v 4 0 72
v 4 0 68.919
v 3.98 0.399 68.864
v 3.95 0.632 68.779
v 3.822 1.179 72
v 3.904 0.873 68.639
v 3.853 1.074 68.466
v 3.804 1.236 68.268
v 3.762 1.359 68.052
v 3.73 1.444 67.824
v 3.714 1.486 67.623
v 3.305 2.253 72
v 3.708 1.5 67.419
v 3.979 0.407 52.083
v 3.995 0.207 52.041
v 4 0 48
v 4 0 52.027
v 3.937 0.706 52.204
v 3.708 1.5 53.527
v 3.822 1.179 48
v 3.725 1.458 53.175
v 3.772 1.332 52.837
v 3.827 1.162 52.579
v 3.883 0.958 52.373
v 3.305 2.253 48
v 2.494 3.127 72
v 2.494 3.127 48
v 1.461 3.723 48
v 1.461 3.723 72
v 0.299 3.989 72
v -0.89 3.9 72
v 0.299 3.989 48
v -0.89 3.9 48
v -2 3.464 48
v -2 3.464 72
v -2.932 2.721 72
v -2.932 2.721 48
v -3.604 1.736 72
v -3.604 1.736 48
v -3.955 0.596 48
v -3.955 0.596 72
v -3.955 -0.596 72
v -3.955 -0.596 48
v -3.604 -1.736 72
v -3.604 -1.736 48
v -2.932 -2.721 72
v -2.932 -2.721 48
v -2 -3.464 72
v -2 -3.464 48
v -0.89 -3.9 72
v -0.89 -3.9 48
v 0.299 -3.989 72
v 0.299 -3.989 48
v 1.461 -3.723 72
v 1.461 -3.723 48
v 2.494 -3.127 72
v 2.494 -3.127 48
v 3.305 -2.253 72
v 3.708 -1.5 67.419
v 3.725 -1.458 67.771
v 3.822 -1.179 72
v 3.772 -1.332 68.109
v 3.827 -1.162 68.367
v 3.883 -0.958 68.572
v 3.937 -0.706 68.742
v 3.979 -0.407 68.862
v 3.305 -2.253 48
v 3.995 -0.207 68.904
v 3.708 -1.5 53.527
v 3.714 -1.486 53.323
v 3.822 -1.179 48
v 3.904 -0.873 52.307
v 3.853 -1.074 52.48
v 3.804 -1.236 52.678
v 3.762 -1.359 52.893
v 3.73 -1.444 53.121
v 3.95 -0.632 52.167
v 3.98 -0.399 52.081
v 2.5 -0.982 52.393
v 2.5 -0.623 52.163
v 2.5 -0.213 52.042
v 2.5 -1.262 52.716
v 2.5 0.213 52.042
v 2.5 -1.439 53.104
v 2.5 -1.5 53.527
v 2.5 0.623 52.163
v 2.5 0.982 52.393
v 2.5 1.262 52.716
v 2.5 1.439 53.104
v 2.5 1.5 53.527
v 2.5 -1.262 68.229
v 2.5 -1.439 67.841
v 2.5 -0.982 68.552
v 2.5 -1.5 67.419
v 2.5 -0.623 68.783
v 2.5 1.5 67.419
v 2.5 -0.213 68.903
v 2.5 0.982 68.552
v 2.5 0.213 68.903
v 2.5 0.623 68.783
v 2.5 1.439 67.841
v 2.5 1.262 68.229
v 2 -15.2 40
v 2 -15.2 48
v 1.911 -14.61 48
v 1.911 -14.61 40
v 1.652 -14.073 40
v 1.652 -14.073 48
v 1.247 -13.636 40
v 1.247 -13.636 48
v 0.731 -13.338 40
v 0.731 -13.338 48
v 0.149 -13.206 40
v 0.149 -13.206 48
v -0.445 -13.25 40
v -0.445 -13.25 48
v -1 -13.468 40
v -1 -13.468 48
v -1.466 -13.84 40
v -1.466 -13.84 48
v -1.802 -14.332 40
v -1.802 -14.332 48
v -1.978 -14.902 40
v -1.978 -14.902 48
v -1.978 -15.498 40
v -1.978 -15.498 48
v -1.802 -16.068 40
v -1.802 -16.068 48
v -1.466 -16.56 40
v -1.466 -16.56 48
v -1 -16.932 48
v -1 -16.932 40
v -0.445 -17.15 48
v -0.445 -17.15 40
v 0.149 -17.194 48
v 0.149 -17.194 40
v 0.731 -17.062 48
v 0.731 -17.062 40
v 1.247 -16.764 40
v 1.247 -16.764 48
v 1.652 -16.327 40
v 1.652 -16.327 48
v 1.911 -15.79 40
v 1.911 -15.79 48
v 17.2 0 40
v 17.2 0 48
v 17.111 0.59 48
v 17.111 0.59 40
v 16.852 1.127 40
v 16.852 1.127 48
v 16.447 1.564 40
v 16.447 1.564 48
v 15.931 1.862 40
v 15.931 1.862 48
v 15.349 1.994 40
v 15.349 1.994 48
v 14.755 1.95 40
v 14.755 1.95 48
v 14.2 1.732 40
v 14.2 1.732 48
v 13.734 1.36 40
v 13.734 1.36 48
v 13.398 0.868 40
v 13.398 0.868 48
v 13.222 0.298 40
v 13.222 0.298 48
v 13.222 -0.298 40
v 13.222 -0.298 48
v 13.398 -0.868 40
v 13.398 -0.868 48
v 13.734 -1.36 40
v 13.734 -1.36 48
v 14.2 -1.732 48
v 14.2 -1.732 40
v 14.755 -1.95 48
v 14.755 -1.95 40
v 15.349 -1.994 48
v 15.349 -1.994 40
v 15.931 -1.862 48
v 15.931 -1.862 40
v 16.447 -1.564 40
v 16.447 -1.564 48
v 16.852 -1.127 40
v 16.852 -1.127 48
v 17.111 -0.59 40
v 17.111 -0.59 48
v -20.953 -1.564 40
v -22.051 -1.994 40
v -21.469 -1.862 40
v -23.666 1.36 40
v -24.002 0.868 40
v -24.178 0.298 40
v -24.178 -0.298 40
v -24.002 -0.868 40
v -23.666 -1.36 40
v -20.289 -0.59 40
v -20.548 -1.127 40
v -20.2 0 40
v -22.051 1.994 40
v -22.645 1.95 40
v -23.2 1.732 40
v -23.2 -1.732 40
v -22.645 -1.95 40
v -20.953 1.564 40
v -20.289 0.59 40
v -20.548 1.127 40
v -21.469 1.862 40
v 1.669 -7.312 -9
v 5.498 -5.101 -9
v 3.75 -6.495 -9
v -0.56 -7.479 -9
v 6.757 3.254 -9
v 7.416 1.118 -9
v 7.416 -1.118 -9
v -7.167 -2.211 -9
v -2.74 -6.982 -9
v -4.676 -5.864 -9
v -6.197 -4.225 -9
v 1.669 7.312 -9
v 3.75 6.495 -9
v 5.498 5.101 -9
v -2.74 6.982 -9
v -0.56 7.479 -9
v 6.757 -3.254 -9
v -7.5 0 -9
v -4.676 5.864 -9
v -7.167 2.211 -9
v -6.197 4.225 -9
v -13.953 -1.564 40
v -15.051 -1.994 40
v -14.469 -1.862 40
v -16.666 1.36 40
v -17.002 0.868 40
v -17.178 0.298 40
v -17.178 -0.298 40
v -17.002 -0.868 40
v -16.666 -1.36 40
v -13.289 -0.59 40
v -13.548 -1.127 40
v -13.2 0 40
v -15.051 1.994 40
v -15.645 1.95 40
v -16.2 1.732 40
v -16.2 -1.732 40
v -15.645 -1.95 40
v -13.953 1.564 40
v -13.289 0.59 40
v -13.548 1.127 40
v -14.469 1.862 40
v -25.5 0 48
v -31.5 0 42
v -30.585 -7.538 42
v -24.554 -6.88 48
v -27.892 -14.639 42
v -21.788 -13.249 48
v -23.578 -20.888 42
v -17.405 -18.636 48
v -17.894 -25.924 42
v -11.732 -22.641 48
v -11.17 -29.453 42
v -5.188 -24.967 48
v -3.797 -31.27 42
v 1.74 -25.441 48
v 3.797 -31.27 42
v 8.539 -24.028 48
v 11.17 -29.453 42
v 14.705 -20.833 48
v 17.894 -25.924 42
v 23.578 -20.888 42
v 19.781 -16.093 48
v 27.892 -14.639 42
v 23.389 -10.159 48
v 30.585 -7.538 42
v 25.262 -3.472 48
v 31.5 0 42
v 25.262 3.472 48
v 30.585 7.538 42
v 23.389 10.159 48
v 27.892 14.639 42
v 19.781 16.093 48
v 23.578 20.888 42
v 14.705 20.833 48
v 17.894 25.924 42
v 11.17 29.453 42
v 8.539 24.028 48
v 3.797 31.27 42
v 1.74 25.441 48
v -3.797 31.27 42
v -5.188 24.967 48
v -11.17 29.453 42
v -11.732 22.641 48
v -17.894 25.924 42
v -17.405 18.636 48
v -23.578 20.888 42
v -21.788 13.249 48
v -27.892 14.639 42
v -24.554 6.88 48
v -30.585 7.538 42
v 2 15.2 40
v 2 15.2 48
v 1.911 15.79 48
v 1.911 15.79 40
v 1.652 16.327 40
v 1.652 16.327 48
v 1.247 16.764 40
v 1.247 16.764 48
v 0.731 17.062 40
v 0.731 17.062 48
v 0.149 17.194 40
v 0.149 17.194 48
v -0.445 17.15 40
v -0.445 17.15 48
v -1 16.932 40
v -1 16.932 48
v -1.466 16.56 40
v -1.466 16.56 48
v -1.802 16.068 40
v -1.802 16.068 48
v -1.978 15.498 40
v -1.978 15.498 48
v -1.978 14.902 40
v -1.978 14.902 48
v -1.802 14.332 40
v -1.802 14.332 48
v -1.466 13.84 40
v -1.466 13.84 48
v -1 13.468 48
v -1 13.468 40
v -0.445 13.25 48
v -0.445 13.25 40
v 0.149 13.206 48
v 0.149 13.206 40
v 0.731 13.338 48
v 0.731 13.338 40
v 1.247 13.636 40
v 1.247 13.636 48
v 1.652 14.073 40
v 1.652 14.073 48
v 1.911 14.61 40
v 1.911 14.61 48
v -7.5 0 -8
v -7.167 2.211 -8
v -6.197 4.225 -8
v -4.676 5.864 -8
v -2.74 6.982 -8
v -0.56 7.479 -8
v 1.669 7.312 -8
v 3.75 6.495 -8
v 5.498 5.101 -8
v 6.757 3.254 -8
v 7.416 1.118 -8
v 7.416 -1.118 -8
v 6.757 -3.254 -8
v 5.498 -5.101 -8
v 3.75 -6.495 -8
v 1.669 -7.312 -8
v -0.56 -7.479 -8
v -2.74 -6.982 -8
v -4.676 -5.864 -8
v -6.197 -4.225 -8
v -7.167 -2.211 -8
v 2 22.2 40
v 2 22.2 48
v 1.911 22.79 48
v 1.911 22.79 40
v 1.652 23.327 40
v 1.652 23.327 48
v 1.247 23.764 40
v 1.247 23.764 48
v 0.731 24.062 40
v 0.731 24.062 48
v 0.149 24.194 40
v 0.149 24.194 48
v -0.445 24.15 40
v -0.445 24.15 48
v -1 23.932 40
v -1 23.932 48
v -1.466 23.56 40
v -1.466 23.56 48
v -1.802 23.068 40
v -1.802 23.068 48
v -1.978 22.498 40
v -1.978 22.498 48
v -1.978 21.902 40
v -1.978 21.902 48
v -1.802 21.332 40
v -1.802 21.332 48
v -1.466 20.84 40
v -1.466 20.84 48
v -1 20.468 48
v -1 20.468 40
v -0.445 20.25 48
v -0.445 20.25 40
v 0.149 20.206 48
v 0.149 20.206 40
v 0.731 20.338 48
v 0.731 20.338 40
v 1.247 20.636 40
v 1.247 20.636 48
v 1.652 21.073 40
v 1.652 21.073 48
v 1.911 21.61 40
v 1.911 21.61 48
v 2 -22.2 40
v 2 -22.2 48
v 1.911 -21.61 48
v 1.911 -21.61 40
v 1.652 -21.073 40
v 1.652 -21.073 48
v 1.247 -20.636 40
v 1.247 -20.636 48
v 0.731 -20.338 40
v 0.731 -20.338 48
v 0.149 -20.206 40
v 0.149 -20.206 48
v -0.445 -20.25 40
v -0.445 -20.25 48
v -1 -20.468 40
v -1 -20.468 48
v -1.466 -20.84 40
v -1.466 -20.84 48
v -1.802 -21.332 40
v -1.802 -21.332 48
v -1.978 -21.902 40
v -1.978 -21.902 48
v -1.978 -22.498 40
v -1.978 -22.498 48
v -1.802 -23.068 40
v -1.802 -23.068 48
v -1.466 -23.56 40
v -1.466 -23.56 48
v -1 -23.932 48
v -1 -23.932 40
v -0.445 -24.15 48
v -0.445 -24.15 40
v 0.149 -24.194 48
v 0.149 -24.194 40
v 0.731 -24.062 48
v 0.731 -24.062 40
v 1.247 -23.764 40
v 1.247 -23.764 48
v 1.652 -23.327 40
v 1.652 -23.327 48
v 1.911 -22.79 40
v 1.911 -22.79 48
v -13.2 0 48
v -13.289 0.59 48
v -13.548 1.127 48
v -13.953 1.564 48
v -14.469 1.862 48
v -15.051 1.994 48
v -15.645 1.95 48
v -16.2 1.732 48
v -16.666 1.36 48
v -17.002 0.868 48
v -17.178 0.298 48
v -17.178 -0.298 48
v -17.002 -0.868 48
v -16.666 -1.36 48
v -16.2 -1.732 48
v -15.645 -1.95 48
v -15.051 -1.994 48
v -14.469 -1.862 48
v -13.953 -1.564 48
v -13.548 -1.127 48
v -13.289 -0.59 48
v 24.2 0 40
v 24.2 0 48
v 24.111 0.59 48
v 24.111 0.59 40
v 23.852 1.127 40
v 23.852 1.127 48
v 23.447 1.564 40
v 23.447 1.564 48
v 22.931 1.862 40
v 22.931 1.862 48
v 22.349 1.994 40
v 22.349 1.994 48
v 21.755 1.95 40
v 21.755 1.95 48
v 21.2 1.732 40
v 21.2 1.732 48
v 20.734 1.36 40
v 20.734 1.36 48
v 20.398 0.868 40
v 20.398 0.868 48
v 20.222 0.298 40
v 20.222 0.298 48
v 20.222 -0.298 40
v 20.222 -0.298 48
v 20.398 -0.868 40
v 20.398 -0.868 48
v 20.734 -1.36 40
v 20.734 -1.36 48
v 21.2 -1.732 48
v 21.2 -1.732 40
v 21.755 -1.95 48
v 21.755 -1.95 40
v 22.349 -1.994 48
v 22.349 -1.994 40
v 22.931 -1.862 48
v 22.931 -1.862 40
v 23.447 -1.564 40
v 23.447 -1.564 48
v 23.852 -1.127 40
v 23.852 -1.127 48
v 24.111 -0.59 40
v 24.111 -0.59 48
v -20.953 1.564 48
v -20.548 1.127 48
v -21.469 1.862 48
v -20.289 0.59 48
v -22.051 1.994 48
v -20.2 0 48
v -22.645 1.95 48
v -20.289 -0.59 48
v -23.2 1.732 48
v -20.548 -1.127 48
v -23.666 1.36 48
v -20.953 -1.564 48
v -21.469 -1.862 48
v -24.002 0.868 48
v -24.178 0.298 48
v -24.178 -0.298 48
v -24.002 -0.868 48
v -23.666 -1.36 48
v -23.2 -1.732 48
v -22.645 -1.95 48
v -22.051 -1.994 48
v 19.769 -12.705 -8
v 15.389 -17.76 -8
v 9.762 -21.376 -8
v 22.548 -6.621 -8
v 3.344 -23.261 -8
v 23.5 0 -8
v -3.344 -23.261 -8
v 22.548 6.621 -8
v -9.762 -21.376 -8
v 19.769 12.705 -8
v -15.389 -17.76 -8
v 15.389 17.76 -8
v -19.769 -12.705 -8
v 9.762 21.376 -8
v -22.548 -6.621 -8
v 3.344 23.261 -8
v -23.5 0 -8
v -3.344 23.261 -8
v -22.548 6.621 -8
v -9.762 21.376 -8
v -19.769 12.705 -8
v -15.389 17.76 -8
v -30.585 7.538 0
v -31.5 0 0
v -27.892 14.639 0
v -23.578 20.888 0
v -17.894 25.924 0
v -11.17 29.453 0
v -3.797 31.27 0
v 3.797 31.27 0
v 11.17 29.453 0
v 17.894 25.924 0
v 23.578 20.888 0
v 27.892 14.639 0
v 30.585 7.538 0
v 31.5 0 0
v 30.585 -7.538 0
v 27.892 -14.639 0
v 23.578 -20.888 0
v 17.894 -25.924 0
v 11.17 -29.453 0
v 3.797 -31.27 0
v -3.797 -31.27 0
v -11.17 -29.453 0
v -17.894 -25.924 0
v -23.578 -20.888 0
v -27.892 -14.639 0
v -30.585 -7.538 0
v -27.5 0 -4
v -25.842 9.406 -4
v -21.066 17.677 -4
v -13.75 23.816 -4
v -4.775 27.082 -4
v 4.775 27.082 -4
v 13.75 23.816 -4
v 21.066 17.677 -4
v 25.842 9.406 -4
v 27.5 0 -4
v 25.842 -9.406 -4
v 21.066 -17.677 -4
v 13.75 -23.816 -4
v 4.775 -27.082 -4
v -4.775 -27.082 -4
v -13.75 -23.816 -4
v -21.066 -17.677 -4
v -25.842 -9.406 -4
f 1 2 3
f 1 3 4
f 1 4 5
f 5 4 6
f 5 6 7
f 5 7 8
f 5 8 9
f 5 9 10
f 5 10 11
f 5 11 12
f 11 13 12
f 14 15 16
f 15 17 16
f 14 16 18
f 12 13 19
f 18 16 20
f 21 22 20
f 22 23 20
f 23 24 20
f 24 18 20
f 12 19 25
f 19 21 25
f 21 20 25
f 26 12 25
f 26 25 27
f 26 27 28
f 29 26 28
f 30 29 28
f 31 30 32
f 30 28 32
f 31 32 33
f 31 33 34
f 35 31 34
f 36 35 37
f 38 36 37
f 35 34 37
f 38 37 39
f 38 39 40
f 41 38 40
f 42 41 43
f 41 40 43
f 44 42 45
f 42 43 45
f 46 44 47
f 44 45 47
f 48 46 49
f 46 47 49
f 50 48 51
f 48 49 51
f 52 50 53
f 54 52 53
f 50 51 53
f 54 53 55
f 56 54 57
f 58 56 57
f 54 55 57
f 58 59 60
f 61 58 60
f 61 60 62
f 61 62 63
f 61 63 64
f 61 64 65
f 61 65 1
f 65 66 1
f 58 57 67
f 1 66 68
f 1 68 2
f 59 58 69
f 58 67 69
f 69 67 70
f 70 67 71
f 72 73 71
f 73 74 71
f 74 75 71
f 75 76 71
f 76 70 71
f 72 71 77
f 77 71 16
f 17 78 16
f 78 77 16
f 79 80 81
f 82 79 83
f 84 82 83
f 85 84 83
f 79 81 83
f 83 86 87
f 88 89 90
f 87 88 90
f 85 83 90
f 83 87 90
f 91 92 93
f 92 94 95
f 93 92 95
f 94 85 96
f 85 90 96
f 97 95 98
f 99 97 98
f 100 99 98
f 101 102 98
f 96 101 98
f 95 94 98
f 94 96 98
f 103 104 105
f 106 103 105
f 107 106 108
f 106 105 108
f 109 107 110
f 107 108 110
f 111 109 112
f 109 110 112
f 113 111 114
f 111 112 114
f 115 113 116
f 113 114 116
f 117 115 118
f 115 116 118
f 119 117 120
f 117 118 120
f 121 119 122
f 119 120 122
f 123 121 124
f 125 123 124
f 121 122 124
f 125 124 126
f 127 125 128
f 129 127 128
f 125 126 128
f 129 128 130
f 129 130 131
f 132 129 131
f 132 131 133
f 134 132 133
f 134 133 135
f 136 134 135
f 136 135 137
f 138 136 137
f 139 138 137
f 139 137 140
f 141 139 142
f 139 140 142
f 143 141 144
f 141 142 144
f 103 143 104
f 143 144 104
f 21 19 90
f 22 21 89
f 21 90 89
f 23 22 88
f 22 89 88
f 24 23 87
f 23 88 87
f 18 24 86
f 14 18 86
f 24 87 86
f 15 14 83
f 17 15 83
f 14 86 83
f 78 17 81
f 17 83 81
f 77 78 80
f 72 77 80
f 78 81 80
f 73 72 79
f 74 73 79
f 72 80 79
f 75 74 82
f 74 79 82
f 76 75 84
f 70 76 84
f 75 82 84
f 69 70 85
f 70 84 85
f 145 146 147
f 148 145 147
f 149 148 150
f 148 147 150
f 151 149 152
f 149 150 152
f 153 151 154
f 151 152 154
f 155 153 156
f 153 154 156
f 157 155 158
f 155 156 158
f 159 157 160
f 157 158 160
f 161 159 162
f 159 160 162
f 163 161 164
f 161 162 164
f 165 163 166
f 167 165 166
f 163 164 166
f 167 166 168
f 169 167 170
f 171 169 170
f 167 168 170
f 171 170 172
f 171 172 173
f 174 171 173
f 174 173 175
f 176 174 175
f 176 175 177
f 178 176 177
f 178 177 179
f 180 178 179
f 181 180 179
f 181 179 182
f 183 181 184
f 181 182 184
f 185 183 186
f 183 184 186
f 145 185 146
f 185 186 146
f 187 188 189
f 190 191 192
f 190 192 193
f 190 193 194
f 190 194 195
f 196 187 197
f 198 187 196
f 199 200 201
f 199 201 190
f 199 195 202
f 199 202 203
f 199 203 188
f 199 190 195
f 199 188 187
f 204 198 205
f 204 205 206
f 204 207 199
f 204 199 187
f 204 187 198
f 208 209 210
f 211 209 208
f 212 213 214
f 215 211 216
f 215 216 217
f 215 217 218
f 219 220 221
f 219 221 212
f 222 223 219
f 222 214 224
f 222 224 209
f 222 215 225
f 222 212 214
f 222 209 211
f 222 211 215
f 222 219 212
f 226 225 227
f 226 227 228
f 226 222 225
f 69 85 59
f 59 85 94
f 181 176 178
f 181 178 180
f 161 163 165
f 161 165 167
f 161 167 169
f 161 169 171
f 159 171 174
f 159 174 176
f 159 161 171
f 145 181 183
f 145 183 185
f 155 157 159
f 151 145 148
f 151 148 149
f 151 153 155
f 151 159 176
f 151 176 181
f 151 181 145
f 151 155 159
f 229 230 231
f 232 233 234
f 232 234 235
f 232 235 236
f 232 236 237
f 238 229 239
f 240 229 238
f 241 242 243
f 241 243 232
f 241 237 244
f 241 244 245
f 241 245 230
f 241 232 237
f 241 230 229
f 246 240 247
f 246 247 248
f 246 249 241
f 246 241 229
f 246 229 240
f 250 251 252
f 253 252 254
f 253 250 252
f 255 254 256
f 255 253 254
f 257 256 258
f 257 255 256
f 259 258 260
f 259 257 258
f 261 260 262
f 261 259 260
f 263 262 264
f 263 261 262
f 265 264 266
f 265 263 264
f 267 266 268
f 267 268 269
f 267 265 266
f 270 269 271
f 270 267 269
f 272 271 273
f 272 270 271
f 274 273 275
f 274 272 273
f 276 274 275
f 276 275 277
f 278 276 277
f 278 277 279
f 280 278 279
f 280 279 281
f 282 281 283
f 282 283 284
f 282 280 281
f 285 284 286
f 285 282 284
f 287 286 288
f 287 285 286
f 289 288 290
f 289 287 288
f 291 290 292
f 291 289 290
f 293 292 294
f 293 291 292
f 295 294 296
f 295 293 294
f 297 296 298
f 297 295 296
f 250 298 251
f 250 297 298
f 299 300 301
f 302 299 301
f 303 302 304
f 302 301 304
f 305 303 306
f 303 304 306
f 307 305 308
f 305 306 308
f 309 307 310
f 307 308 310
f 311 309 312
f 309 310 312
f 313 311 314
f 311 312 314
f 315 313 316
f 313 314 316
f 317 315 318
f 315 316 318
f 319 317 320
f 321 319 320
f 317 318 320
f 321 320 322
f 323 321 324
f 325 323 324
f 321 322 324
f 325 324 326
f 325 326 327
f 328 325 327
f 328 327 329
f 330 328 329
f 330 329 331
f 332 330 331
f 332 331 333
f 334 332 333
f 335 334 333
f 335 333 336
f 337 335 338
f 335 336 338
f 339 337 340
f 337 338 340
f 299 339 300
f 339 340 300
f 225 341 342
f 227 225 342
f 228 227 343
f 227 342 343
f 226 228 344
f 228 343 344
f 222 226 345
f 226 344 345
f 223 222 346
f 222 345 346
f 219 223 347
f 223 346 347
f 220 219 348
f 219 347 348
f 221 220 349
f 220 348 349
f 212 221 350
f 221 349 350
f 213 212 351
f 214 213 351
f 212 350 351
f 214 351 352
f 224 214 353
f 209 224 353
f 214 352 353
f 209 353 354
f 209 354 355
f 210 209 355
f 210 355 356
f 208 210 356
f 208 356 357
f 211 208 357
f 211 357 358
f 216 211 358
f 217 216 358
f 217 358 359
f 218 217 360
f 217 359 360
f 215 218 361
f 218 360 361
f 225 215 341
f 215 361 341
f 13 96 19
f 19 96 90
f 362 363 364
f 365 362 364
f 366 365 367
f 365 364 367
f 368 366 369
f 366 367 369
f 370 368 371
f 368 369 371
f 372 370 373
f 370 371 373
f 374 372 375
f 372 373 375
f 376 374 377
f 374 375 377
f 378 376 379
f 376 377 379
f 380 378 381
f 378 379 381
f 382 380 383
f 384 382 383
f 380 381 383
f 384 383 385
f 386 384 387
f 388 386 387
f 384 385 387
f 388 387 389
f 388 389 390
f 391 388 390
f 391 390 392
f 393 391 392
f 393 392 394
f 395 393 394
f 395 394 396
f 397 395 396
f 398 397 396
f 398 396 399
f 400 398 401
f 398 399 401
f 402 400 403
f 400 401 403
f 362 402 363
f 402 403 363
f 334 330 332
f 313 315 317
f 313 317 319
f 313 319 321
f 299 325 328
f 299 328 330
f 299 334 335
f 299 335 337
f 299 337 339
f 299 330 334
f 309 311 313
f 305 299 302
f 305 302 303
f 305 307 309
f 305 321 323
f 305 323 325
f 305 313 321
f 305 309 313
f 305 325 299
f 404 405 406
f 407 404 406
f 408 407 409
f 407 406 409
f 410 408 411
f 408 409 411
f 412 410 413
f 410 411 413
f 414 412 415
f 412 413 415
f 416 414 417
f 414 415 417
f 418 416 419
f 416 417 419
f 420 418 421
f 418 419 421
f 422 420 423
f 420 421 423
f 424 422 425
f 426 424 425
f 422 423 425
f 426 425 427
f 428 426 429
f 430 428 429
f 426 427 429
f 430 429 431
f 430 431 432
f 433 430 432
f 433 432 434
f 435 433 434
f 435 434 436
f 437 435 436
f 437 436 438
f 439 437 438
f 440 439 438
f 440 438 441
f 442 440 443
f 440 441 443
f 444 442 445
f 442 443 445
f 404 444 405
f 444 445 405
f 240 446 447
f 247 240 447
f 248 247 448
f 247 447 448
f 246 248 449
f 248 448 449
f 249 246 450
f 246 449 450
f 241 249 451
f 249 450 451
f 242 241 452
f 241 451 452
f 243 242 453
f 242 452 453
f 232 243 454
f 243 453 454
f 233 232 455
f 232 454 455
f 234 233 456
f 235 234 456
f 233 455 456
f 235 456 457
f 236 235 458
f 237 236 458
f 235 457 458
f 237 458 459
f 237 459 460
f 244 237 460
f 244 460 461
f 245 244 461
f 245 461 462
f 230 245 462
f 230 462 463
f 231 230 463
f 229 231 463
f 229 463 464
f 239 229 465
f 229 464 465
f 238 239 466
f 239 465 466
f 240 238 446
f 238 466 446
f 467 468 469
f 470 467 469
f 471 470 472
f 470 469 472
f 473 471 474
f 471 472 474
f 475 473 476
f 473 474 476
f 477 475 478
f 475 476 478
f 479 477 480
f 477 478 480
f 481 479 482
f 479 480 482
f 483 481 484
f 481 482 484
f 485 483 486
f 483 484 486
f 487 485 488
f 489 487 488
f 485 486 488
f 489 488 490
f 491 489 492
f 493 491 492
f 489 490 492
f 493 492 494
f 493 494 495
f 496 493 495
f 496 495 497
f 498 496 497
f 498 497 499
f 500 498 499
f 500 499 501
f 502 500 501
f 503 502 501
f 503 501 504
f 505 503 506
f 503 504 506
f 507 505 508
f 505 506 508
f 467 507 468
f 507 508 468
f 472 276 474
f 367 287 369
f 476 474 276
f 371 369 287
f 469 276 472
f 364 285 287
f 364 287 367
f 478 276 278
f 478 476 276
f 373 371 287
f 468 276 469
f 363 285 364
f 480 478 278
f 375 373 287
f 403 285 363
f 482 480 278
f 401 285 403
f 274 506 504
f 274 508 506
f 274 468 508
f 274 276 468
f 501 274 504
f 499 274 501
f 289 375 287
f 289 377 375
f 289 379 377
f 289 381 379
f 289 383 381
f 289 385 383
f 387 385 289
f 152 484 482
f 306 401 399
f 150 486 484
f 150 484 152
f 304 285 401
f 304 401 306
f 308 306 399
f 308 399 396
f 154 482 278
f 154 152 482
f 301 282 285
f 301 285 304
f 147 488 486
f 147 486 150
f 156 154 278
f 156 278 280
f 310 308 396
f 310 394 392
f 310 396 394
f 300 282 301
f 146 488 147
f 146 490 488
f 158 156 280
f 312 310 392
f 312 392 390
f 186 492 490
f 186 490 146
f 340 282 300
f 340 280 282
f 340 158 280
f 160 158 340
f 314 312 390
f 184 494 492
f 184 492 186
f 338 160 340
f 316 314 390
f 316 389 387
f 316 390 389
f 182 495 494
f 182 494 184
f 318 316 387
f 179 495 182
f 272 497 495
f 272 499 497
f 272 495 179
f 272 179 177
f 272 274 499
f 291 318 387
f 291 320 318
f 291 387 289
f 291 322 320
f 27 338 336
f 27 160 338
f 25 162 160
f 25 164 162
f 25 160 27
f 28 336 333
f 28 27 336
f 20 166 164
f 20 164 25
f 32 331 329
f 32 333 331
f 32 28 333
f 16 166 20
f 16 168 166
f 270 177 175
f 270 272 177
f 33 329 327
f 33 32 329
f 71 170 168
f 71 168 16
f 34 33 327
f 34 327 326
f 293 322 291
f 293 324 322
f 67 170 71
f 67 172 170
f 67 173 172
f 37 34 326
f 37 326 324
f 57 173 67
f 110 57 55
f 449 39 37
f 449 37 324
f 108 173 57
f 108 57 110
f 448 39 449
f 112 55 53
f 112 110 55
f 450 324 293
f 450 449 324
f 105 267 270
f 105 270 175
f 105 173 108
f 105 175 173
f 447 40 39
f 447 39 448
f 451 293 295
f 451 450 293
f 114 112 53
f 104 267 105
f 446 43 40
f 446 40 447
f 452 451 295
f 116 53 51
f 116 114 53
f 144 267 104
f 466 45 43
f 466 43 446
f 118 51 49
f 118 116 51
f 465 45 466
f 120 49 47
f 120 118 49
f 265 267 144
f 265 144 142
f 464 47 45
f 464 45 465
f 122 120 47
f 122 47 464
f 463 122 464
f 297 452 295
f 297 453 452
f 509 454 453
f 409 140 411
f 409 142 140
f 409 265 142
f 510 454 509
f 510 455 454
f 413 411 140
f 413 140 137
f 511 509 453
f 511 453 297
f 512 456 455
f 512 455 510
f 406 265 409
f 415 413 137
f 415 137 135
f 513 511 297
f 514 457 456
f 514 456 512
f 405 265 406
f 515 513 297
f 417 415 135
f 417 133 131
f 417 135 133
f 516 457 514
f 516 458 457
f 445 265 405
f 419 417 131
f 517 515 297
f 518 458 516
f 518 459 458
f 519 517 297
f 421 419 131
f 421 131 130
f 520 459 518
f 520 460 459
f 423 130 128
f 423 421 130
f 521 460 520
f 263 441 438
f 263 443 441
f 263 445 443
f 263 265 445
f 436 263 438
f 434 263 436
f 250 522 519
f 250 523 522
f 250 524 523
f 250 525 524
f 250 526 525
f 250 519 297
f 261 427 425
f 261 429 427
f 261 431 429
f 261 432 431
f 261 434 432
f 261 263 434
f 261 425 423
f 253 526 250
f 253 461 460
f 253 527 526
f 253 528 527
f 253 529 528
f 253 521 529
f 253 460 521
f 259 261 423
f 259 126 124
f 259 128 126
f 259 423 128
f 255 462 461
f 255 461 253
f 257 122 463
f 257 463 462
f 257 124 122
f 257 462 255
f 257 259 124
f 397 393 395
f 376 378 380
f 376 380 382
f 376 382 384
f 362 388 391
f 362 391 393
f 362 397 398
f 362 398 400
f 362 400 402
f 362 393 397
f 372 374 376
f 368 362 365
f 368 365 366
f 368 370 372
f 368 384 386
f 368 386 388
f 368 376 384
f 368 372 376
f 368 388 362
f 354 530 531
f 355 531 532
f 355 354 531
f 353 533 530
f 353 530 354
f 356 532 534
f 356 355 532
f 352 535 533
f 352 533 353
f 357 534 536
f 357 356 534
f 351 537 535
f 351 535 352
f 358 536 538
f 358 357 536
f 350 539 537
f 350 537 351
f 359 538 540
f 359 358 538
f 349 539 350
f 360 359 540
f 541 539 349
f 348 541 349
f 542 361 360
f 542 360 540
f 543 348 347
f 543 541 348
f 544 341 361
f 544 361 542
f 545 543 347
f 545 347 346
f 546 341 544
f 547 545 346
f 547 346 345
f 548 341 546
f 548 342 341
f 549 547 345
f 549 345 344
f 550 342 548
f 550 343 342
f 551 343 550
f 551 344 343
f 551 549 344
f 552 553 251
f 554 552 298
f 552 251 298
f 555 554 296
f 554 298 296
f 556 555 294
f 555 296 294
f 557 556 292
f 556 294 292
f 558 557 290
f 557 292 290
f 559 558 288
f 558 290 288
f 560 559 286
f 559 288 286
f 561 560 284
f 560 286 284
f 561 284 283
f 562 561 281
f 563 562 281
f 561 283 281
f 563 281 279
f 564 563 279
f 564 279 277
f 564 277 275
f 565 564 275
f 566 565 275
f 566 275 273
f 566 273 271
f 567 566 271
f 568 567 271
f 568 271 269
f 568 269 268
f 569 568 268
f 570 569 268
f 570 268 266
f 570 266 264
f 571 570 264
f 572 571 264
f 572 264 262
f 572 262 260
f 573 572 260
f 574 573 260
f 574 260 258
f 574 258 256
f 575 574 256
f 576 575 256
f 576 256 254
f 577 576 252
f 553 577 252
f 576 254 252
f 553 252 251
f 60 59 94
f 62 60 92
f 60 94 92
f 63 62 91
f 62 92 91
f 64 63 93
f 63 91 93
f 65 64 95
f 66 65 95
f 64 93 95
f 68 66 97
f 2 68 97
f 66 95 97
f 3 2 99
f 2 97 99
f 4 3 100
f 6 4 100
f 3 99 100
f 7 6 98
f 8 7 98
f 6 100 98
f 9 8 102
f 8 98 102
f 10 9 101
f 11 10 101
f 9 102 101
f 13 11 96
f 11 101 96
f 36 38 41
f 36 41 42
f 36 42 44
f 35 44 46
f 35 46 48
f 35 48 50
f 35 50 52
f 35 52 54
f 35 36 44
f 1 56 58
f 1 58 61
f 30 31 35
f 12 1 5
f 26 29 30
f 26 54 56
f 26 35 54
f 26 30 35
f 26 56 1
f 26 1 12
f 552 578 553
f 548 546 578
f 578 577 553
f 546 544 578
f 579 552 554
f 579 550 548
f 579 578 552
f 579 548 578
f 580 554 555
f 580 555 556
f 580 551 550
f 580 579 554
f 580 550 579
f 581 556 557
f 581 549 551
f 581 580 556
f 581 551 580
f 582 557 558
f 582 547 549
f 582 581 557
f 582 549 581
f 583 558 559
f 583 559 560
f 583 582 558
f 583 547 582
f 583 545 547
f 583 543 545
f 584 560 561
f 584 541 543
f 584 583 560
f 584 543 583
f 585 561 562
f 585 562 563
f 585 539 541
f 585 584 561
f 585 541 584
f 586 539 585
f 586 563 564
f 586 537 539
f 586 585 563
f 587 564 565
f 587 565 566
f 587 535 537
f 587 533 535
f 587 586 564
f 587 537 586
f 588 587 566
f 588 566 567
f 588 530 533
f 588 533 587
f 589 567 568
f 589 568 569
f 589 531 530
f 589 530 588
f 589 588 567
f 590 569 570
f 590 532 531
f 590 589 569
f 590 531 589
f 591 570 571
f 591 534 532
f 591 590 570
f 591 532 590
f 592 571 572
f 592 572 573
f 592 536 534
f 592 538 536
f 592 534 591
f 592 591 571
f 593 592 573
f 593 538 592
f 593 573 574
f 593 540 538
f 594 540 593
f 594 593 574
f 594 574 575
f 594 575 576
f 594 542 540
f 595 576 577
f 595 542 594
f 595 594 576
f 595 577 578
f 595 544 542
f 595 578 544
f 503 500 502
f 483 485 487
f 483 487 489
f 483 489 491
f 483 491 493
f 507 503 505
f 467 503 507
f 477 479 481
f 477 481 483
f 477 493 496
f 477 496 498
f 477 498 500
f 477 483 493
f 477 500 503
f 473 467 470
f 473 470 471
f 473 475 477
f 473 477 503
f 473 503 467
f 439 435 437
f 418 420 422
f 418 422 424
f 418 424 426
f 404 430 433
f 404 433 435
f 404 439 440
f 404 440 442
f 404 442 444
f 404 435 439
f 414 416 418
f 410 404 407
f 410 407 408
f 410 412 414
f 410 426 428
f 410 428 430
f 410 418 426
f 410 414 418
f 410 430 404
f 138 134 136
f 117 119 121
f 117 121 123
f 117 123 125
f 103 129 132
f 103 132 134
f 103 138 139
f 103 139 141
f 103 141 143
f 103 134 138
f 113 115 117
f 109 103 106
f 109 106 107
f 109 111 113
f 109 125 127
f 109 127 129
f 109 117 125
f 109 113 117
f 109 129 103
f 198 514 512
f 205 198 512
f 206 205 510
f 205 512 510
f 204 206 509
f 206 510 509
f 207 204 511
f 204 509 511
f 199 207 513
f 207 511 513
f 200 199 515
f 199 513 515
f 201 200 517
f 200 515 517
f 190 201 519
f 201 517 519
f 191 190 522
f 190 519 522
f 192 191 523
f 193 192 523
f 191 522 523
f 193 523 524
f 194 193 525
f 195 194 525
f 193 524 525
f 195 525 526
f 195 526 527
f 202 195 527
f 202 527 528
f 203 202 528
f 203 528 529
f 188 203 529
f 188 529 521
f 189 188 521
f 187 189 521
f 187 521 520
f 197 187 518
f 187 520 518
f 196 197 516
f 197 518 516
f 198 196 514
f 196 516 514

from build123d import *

# Parameters (mm, degrees)
SKETCH1_R           = 31.5
BOSS_EXTRUDE1_DEPTH = 42
SKETCH2_R           = 31.5
BOSS_EXTRUDE2_DEPTH = 6
CHAMFER1_SIZE       = 6
SKETCH4_R           = 31.5
BOSS_EXTRUDE3_DEPTH = 8
CHAMFER2_SIZE       = 8
SKETCH6_R           = 7.5
BOSS_EXTRUDE4_DEPTH = 1
SKETCH7_R           = 4
BOSS_EXTRUDE5_DEPTH = 24
SKETCH10_R          = 2
CUT_EXTRUDE4_DEPTH  = 8
CUT_EXTRUDE5_DEPTH  = 10


with BuildPart() as part:
    # Sketch1 → Boss-Extrude1 (new body)
    with BuildSketch(Plane.XY):
        with Locations(Location((0, 0, 0), (0, 0, 180))):
            Circle(SKETCH1_R)
    extrude(amount=BOSS_EXTRUDE1_DEPTH)

    # Sketch2 → Boss-Extrude2 (add)
    with BuildSketch(Plane.XY.offset(42)):
        with Locations(Location((0, 0, 0), (0, 0, 180))):
            Circle(SKETCH2_R)
    extrude(amount=BOSS_EXTRUDE2_DEPTH)

    # Chamfer1
    chamfer1_edges = [part.edges().sort_by_distance(p)[0] for p in [
        (31.5, 0, 48),
    ]]
    chamfer(chamfer1_edges, length=CHAMFER1_SIZE)

    # Sketch4 → Boss-Extrude3 (add)
    with BuildSketch(Plane(origin=(0, 0, 0), x_dir=(-1, 0, 0), z_dir=(0, 0, -1))):
        Circle(SKETCH4_R)
    extrude(amount=BOSS_EXTRUDE3_DEPTH)

    # Chamfer2
    chamfer2_edges = [part.edges().sort_by_distance(p)[0] for p in [
        (31.5, 0, -8),
    ]]
    chamfer(chamfer2_edges, length=CHAMFER2_SIZE)

    # Sketch6 → Boss-Extrude4 (add)
    with BuildSketch(Plane(origin=(0, 0, -8), x_dir=(-1, 0, 0), z_dir=(0, 0, -1))):
        Circle(SKETCH6_R)
    extrude(amount=BOSS_EXTRUDE4_DEPTH)

    # Sketch7 → Boss-Extrude5 (add)
    with BuildSketch(Plane.XY.offset(48)):
        Circle(SKETCH7_R)
    extrude(amount=BOSS_EXTRUDE5_DEPTH)

    # Sketch10 → Cut-Extrude4 (cut)
    with BuildSketch(Plane.XY.offset(48)):
        with Locations((0, 15.2)):
            Circle(SKETCH10_R)
        with Locations((0, 22.2)):
            Circle(SKETCH10_R)
        with Locations((22.2, 0)):
            Circle(SKETCH10_R)
        with Locations((15.2, 0)):
            Circle(SKETCH10_R)
        with Locations((0, -22.2)):
            Circle(SKETCH10_R)
        with Locations((0, -15.2)):
            Circle(SKETCH10_R)
        with Locations((-22.2, 0)):
            Circle(SKETCH10_R)
        with Locations((-15.2, 0)):
            Circle(SKETCH10_R)
    extrude(amount=-CUT_EXTRUDE4_DEPTH, mode=Mode.SUBTRACT)

    # Sketch11 → Cut-Extrude5 (cut)
    with BuildSketch(Plane(origin=(2.5, 0, 0), x_dir=(0, 0, -1), z_dir=(1, 0, 0))):
        with BuildLine():
            Line((-67.418537693, 1.5), (-53.527084748, 1.5))
            ThreePointArc((-53.527084748, 1.5), (-52.027084748, 0), (-53.527084748, -1.5))
            Line((-53.527084748, -1.5), (-67.418537693, -1.5))
            ThreePointArc((-67.418537693, -1.5), (-68.918537693, 0), (-67.418537693, 1.5))
        make_face()
    extrude(amount=CUT_EXTRUDE5_DEPTH, mode=Mode.SUBTRACT)


solid = part.part
